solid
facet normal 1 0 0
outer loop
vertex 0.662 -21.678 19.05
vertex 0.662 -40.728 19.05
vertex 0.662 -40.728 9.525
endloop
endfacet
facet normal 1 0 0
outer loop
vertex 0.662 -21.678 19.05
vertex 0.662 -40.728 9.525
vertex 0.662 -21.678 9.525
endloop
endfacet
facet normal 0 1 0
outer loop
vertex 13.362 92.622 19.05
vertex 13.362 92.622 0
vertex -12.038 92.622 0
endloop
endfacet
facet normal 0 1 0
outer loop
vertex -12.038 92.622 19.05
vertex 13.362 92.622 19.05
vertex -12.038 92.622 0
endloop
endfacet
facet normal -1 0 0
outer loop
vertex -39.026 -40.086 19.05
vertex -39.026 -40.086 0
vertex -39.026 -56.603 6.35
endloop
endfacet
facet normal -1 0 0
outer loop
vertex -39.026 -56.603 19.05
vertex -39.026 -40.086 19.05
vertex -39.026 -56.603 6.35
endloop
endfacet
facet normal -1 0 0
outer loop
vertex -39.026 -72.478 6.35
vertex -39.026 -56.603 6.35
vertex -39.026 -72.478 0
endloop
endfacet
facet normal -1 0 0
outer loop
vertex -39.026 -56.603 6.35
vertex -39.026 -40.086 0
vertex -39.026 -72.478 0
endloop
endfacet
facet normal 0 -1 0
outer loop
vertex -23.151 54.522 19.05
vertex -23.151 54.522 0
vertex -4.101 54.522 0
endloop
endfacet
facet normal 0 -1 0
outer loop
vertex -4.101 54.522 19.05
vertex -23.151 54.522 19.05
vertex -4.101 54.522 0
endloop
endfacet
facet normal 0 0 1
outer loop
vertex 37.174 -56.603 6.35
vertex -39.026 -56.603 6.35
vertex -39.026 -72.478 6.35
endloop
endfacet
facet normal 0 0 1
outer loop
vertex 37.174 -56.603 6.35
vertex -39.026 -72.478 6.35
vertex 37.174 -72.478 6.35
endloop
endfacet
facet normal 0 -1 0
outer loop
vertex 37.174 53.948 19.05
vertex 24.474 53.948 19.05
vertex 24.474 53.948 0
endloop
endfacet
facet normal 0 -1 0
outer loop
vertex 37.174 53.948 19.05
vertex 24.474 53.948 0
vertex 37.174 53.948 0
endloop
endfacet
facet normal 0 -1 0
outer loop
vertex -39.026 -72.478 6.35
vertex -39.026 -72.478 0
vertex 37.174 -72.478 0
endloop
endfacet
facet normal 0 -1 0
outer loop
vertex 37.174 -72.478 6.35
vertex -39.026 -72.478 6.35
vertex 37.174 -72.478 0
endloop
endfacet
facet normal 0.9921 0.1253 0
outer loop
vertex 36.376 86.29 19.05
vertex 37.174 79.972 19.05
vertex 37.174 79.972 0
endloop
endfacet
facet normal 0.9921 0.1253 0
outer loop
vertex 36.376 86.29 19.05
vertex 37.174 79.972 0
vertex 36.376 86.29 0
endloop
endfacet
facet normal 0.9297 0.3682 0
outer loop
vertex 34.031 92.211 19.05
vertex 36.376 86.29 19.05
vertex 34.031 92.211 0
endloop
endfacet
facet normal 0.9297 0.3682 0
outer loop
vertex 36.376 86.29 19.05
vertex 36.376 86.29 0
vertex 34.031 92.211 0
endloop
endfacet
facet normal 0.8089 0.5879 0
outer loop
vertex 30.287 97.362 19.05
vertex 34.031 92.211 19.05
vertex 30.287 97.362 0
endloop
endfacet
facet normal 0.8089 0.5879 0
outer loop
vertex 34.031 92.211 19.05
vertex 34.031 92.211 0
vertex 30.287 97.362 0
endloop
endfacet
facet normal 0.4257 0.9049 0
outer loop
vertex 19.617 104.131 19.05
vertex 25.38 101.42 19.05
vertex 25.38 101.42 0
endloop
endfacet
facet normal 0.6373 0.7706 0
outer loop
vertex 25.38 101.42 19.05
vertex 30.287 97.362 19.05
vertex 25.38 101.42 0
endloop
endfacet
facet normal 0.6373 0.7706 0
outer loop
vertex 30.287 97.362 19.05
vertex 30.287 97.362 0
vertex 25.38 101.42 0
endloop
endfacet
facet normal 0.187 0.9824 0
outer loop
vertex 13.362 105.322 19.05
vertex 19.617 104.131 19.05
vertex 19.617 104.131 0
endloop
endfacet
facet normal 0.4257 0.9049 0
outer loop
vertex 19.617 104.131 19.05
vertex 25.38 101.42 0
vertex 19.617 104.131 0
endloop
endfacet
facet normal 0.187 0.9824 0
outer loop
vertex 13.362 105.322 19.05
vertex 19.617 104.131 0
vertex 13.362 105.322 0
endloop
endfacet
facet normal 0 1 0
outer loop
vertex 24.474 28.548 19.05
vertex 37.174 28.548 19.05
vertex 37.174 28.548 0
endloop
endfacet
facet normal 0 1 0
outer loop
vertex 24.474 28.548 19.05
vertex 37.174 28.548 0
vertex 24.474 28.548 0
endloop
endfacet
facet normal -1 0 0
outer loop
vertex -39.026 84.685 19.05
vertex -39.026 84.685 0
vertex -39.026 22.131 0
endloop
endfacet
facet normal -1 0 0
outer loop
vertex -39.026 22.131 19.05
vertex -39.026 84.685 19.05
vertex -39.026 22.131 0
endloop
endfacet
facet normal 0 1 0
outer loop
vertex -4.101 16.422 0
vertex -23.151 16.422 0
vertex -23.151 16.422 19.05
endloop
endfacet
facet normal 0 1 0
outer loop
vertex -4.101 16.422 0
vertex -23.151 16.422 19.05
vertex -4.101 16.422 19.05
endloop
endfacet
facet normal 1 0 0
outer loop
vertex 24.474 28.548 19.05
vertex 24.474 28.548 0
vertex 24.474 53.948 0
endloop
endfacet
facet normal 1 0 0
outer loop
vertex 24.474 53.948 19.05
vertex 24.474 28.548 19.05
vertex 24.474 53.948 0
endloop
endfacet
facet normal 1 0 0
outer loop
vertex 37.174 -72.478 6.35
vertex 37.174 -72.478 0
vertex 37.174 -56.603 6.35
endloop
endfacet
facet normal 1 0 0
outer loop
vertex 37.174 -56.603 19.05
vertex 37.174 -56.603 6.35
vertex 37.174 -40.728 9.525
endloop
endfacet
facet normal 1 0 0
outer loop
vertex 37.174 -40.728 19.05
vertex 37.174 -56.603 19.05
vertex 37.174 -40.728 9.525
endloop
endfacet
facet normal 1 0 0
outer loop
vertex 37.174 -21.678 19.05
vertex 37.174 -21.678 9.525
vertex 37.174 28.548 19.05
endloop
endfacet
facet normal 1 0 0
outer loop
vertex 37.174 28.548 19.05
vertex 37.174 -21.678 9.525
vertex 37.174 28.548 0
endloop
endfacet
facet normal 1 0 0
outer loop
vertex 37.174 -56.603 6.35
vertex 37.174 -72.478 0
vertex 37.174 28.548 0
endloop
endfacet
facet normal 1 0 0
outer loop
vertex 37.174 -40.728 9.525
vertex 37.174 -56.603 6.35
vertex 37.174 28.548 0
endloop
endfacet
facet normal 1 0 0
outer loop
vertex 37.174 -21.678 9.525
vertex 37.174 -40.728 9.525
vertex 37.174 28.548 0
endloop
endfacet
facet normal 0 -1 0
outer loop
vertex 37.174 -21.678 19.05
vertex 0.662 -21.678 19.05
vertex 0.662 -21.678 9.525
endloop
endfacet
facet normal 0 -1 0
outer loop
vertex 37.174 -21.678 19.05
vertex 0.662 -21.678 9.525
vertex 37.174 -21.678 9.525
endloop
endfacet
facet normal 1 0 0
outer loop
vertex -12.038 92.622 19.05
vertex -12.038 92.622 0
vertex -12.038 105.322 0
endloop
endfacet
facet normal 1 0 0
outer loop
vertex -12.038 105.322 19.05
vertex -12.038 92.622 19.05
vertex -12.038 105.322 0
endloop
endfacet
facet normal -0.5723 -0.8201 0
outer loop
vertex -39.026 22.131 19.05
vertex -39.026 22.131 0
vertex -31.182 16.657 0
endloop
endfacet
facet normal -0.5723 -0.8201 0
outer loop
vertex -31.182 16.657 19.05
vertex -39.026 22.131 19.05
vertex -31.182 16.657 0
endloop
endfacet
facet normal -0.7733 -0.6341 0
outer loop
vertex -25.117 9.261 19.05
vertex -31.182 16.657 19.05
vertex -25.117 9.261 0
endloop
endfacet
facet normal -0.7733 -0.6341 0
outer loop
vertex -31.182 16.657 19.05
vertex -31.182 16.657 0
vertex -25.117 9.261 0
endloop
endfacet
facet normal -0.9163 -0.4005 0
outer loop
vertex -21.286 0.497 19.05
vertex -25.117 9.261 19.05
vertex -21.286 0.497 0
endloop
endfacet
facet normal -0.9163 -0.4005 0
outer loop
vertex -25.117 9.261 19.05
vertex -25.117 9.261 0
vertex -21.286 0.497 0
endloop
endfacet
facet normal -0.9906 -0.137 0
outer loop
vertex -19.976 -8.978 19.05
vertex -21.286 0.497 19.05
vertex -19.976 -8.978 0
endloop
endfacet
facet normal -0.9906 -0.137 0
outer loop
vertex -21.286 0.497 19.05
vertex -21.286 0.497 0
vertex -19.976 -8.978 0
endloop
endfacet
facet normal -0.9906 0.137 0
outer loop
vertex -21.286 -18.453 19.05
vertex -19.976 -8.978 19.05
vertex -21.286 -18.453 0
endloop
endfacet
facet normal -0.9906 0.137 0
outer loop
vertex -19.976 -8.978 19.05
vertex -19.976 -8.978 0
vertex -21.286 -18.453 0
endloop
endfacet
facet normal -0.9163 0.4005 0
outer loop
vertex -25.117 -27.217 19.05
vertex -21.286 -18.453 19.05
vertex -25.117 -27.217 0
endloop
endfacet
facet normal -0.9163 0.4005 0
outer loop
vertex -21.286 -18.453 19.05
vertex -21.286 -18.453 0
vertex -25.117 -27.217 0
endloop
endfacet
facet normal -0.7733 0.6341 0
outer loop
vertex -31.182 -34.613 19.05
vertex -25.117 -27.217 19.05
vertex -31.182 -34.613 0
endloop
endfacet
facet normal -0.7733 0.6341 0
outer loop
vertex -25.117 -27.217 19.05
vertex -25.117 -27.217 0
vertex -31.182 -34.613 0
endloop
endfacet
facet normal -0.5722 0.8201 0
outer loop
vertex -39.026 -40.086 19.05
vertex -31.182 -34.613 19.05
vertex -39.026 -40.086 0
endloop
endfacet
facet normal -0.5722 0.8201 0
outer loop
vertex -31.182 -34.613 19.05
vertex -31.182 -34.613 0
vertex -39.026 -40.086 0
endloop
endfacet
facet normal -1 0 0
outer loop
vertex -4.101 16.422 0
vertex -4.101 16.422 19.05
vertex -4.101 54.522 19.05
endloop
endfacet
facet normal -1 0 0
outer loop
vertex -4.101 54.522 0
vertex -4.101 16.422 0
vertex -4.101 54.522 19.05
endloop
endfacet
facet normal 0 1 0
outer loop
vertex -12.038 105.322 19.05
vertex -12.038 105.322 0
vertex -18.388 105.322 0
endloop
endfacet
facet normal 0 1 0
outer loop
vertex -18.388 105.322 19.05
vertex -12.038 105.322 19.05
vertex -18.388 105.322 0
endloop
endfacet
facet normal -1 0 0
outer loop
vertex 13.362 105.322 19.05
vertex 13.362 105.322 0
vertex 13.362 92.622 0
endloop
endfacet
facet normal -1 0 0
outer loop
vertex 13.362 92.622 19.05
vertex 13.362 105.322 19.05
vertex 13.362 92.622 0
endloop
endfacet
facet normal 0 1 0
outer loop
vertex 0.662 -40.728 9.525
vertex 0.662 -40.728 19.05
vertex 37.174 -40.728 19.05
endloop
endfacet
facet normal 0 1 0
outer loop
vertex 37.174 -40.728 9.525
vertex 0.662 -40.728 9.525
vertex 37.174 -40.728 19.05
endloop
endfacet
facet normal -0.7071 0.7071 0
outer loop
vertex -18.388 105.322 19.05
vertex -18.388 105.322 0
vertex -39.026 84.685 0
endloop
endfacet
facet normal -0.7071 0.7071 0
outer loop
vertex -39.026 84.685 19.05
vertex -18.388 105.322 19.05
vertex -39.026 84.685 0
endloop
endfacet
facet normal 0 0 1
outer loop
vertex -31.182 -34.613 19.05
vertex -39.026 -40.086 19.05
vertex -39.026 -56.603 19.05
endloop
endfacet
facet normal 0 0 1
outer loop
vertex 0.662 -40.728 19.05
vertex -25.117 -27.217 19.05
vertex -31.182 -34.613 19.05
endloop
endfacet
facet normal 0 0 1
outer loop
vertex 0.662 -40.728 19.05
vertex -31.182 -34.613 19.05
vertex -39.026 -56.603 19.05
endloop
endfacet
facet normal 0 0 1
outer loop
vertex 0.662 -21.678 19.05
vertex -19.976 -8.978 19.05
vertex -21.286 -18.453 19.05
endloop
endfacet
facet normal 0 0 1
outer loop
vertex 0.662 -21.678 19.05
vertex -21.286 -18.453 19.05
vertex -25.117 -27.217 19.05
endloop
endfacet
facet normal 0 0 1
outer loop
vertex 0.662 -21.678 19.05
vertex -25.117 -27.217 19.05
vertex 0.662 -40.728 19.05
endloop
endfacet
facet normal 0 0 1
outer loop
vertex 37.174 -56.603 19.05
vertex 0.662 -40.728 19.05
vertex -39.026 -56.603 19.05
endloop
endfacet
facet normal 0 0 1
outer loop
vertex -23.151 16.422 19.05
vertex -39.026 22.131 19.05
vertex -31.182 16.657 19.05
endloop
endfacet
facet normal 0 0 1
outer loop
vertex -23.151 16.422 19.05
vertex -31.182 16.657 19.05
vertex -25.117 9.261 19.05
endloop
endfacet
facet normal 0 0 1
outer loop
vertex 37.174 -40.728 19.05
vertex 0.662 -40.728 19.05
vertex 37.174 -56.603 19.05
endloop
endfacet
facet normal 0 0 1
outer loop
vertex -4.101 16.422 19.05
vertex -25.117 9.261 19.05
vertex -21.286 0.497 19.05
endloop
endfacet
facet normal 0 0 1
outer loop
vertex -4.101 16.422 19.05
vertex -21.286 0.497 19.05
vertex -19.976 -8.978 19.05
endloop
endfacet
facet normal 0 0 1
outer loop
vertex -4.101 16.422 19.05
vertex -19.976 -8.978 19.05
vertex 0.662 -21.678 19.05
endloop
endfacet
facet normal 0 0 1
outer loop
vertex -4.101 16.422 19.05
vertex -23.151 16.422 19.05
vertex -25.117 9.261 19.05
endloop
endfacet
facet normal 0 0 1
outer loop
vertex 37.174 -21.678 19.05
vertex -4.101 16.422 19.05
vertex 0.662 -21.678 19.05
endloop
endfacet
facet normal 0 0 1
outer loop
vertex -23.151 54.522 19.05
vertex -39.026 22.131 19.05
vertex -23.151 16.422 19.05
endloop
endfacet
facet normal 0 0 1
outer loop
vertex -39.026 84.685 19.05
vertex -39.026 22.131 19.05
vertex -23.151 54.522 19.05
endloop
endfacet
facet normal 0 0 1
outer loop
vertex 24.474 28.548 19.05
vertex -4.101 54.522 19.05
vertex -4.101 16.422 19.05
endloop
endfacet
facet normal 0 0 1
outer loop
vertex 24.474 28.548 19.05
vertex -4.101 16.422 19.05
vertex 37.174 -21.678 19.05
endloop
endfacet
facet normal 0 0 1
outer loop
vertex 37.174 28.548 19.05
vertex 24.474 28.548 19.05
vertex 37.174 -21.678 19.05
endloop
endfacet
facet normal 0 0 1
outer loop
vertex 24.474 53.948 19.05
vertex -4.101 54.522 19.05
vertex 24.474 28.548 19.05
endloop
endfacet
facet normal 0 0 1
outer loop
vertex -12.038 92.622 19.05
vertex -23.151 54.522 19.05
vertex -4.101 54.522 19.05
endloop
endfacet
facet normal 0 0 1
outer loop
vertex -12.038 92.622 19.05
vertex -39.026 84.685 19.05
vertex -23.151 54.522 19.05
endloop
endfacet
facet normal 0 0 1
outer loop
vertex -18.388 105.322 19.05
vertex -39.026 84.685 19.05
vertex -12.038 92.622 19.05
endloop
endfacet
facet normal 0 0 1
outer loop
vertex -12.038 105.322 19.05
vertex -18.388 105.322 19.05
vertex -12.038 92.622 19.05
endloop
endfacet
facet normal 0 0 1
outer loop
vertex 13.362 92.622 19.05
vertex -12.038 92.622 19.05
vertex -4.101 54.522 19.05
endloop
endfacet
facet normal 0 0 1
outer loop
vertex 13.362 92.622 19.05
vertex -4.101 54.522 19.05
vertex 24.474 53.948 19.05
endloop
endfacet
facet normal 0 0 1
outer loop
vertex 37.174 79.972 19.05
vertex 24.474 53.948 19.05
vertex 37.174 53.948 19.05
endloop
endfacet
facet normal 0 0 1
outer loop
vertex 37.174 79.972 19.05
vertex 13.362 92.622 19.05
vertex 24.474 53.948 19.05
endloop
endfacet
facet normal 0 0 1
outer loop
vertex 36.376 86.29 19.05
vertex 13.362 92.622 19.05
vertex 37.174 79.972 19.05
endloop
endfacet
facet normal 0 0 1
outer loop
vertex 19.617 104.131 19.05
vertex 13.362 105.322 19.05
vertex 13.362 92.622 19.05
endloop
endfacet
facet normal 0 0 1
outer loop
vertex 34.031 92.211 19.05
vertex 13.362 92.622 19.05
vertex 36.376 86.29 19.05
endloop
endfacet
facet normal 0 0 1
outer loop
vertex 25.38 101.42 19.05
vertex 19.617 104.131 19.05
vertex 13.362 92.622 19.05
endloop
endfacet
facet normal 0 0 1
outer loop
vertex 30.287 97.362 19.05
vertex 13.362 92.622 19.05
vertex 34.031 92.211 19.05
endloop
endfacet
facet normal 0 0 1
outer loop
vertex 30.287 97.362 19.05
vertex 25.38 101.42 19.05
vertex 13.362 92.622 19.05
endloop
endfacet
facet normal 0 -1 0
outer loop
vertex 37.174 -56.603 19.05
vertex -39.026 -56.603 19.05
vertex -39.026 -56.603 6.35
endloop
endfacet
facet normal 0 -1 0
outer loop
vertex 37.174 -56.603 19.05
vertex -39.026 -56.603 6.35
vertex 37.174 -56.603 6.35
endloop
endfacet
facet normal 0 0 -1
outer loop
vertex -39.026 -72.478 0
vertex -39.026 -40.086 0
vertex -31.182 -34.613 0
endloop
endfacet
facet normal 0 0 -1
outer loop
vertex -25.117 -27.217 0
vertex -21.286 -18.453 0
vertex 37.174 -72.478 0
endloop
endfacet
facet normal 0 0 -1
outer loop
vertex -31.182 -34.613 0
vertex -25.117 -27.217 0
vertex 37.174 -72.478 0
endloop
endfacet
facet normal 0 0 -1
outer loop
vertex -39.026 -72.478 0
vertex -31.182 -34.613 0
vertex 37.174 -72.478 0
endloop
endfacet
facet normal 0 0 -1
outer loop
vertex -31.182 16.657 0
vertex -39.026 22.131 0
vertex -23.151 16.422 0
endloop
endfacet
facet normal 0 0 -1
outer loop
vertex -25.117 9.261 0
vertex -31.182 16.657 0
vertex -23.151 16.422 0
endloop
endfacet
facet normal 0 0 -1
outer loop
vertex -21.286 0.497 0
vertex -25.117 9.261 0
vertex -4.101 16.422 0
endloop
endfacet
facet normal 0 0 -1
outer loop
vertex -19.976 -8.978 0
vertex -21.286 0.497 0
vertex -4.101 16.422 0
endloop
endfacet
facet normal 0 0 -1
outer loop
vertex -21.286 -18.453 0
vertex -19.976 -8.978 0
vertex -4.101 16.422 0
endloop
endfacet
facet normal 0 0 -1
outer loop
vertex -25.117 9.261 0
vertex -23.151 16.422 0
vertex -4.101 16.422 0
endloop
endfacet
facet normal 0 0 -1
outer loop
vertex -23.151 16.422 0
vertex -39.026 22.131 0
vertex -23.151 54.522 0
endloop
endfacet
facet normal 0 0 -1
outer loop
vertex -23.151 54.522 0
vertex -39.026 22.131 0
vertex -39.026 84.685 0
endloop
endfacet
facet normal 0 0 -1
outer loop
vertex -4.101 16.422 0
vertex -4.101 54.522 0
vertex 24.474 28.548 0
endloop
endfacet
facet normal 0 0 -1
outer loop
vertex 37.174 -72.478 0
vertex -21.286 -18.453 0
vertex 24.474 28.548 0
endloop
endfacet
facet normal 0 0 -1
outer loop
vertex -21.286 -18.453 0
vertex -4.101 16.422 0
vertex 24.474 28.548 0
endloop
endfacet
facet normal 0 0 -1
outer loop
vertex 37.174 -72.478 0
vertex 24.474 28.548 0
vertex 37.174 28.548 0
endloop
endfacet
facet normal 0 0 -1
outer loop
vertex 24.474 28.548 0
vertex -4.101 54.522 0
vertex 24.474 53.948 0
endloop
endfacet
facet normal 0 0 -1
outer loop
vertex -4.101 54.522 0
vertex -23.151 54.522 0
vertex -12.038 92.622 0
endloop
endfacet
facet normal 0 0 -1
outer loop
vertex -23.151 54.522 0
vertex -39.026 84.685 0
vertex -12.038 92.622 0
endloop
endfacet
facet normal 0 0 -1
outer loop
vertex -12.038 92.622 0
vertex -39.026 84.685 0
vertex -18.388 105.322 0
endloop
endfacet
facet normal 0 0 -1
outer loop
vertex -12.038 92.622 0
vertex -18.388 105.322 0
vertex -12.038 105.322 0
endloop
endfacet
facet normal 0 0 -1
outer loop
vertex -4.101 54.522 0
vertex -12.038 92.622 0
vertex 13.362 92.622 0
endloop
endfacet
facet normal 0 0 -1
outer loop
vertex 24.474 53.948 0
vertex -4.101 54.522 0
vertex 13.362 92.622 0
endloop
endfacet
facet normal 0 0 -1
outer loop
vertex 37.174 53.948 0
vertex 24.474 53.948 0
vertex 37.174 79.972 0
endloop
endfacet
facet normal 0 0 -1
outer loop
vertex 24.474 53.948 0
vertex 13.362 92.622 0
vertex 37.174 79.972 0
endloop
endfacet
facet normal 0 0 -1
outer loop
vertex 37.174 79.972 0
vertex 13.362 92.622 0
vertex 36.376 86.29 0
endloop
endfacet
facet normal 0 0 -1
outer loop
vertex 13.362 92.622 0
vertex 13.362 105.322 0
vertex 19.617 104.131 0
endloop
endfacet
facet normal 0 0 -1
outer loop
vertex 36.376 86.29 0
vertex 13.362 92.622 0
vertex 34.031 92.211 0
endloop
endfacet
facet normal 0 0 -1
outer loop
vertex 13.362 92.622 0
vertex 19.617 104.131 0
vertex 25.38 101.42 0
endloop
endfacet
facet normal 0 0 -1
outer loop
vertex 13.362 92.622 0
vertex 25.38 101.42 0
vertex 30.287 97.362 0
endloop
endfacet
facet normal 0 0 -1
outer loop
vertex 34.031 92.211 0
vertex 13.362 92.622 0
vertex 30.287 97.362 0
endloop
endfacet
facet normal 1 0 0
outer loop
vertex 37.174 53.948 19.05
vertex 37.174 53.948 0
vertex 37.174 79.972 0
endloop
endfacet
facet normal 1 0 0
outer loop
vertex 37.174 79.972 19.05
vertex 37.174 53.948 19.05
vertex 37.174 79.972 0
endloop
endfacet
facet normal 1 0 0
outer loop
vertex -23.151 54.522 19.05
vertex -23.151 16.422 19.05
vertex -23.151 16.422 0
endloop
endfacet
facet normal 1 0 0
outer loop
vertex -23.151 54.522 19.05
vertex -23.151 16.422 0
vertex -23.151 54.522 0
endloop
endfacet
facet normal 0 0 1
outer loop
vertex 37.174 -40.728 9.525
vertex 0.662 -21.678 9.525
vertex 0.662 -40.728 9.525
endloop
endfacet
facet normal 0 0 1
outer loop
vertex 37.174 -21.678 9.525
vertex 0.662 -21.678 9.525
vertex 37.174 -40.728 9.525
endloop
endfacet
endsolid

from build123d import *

# Parameters (mm, degrees)
F1_DEPTH    = 19.05
F2_W        = 76.2
F2_H        = 15.875
F3_DEPTH    = 12.7
F4_W        = 36.5125
F4_H        = 19.05
F5_DEPTH    = 9.525
F6_W        = 19.05
F6_H        = 38.1
F7_DEPTH    = 25.4
F8_T1_DEPTH = 145.8017104175


# Not quite as in the source:
# - a fillet or chamfer that OpenCascade refuses, or shapes differently, is made with other operations: its cross-section is extruded or revolved along the edge and cut away or added


with BuildPart() as f1:
    # F0 (on Top) → F1 (new body)
    with BuildSketch(Plane.XY):
        with BuildLine():
            Line((-39.025861299, -56.6028431063), (-39.025861299, -72.4778431063))
            Line((-39.025861299, -72.4778431063), (37.174138701, -72.4778431063))
            Line((37.174138701, -72.4778431063), (37.174138701, 28.547687456))
            Line((37.174138701, 28.547687456), (24.474138701, 28.547687456))
            Line((24.474138701, 28.547687456), (24.474138701, 53.947687456))
            Line((24.474138701, 53.947687456), (37.174138701, 53.947687456))
            Line((37.174138701, 53.947687456), (37.174138701, 105.3221568937))
            Line((37.174138701, 105.3221568937), (13.361638701, 105.3221568937))
            Line((13.361638701, 105.3221568937), (13.361638701, 92.6221568937))
            Line((13.361638701, 92.6221568937), (-12.038361299, 92.6221568937))
            Line((-12.038361299, 92.6221568937), (-12.038361299, 105.3221568937))
            Line((-12.038361299, 105.3221568937), (-18.388361299, 105.3221568937))
            Line((-18.388361299, 105.3221568937), (-39.025861299, 84.6846568937))
            Line((-39.025861299, 84.6846568937), (-39.025861299, 22.130676627))
            ThreePointArc((-39.025861299, 22.130676627), (-19.975861299, -8.9778431063), (-39.025861299, -40.0863628397))
            Line((-39.025861299, -40.0863628397), (-39.025861299, -40.7278431063))
            Line((-39.025861299, -40.7278431063), (-39.025861299, -56.6028431063))
        make_face()
    extrude(amount=F1_DEPTH)

    # F2 (on face) → F3 (cut)
    with BuildSketch(Plane.XY.offset(19.05)):
        with Locations((-0.925861299, -64.5403431063)):
            Rectangle(F2_W, F2_H)
    extrude(amount=-F3_DEPTH, mode=Mode.SUBTRACT)

    # F4 (on face) → F5 (cut)
    with BuildSketch(Plane.XY.offset(19.05)):
        with Locations((18.917888701, -31.2028431063)):
            Rectangle(F4_W, F4_H)
    extrude(amount=-F5_DEPTH, mode=Mode.SUBTRACT)

    # F6 (on face) → F7 (cut)
    with BuildSketch(Plane.XY.offset(19.05)):
        with Locations((-13.625861299, 35.4721568937)):
            Rectangle(F6_W, F6_H)
    extrude(amount=-F7_DEPTH, mode=Mode.SUBTRACT)

    # F8: fillet of radius 25.4 on 1 edges, made by hand

    # F8_s2 → F8_t1 (cut)
    with BuildSketch(Plane.XY.offset(-63.3758552087)):
        with BuildLine():
            ThreePointArc((37.174138701, 79.9718148102), (30.2874109671, 97.3620060109), (13.361638701, 105.3221568937))
            Line((13.361638701, 105.3221568937), (37.174138701, 105.3221568937))
            Line((37.174138701, 105.3221568937), (37.174138701, 79.9718148102))
        make_face()
    extrude(amount=F8_T1_DEPTH, mode=Mode.SUBTRACT)


solid = f1.part
